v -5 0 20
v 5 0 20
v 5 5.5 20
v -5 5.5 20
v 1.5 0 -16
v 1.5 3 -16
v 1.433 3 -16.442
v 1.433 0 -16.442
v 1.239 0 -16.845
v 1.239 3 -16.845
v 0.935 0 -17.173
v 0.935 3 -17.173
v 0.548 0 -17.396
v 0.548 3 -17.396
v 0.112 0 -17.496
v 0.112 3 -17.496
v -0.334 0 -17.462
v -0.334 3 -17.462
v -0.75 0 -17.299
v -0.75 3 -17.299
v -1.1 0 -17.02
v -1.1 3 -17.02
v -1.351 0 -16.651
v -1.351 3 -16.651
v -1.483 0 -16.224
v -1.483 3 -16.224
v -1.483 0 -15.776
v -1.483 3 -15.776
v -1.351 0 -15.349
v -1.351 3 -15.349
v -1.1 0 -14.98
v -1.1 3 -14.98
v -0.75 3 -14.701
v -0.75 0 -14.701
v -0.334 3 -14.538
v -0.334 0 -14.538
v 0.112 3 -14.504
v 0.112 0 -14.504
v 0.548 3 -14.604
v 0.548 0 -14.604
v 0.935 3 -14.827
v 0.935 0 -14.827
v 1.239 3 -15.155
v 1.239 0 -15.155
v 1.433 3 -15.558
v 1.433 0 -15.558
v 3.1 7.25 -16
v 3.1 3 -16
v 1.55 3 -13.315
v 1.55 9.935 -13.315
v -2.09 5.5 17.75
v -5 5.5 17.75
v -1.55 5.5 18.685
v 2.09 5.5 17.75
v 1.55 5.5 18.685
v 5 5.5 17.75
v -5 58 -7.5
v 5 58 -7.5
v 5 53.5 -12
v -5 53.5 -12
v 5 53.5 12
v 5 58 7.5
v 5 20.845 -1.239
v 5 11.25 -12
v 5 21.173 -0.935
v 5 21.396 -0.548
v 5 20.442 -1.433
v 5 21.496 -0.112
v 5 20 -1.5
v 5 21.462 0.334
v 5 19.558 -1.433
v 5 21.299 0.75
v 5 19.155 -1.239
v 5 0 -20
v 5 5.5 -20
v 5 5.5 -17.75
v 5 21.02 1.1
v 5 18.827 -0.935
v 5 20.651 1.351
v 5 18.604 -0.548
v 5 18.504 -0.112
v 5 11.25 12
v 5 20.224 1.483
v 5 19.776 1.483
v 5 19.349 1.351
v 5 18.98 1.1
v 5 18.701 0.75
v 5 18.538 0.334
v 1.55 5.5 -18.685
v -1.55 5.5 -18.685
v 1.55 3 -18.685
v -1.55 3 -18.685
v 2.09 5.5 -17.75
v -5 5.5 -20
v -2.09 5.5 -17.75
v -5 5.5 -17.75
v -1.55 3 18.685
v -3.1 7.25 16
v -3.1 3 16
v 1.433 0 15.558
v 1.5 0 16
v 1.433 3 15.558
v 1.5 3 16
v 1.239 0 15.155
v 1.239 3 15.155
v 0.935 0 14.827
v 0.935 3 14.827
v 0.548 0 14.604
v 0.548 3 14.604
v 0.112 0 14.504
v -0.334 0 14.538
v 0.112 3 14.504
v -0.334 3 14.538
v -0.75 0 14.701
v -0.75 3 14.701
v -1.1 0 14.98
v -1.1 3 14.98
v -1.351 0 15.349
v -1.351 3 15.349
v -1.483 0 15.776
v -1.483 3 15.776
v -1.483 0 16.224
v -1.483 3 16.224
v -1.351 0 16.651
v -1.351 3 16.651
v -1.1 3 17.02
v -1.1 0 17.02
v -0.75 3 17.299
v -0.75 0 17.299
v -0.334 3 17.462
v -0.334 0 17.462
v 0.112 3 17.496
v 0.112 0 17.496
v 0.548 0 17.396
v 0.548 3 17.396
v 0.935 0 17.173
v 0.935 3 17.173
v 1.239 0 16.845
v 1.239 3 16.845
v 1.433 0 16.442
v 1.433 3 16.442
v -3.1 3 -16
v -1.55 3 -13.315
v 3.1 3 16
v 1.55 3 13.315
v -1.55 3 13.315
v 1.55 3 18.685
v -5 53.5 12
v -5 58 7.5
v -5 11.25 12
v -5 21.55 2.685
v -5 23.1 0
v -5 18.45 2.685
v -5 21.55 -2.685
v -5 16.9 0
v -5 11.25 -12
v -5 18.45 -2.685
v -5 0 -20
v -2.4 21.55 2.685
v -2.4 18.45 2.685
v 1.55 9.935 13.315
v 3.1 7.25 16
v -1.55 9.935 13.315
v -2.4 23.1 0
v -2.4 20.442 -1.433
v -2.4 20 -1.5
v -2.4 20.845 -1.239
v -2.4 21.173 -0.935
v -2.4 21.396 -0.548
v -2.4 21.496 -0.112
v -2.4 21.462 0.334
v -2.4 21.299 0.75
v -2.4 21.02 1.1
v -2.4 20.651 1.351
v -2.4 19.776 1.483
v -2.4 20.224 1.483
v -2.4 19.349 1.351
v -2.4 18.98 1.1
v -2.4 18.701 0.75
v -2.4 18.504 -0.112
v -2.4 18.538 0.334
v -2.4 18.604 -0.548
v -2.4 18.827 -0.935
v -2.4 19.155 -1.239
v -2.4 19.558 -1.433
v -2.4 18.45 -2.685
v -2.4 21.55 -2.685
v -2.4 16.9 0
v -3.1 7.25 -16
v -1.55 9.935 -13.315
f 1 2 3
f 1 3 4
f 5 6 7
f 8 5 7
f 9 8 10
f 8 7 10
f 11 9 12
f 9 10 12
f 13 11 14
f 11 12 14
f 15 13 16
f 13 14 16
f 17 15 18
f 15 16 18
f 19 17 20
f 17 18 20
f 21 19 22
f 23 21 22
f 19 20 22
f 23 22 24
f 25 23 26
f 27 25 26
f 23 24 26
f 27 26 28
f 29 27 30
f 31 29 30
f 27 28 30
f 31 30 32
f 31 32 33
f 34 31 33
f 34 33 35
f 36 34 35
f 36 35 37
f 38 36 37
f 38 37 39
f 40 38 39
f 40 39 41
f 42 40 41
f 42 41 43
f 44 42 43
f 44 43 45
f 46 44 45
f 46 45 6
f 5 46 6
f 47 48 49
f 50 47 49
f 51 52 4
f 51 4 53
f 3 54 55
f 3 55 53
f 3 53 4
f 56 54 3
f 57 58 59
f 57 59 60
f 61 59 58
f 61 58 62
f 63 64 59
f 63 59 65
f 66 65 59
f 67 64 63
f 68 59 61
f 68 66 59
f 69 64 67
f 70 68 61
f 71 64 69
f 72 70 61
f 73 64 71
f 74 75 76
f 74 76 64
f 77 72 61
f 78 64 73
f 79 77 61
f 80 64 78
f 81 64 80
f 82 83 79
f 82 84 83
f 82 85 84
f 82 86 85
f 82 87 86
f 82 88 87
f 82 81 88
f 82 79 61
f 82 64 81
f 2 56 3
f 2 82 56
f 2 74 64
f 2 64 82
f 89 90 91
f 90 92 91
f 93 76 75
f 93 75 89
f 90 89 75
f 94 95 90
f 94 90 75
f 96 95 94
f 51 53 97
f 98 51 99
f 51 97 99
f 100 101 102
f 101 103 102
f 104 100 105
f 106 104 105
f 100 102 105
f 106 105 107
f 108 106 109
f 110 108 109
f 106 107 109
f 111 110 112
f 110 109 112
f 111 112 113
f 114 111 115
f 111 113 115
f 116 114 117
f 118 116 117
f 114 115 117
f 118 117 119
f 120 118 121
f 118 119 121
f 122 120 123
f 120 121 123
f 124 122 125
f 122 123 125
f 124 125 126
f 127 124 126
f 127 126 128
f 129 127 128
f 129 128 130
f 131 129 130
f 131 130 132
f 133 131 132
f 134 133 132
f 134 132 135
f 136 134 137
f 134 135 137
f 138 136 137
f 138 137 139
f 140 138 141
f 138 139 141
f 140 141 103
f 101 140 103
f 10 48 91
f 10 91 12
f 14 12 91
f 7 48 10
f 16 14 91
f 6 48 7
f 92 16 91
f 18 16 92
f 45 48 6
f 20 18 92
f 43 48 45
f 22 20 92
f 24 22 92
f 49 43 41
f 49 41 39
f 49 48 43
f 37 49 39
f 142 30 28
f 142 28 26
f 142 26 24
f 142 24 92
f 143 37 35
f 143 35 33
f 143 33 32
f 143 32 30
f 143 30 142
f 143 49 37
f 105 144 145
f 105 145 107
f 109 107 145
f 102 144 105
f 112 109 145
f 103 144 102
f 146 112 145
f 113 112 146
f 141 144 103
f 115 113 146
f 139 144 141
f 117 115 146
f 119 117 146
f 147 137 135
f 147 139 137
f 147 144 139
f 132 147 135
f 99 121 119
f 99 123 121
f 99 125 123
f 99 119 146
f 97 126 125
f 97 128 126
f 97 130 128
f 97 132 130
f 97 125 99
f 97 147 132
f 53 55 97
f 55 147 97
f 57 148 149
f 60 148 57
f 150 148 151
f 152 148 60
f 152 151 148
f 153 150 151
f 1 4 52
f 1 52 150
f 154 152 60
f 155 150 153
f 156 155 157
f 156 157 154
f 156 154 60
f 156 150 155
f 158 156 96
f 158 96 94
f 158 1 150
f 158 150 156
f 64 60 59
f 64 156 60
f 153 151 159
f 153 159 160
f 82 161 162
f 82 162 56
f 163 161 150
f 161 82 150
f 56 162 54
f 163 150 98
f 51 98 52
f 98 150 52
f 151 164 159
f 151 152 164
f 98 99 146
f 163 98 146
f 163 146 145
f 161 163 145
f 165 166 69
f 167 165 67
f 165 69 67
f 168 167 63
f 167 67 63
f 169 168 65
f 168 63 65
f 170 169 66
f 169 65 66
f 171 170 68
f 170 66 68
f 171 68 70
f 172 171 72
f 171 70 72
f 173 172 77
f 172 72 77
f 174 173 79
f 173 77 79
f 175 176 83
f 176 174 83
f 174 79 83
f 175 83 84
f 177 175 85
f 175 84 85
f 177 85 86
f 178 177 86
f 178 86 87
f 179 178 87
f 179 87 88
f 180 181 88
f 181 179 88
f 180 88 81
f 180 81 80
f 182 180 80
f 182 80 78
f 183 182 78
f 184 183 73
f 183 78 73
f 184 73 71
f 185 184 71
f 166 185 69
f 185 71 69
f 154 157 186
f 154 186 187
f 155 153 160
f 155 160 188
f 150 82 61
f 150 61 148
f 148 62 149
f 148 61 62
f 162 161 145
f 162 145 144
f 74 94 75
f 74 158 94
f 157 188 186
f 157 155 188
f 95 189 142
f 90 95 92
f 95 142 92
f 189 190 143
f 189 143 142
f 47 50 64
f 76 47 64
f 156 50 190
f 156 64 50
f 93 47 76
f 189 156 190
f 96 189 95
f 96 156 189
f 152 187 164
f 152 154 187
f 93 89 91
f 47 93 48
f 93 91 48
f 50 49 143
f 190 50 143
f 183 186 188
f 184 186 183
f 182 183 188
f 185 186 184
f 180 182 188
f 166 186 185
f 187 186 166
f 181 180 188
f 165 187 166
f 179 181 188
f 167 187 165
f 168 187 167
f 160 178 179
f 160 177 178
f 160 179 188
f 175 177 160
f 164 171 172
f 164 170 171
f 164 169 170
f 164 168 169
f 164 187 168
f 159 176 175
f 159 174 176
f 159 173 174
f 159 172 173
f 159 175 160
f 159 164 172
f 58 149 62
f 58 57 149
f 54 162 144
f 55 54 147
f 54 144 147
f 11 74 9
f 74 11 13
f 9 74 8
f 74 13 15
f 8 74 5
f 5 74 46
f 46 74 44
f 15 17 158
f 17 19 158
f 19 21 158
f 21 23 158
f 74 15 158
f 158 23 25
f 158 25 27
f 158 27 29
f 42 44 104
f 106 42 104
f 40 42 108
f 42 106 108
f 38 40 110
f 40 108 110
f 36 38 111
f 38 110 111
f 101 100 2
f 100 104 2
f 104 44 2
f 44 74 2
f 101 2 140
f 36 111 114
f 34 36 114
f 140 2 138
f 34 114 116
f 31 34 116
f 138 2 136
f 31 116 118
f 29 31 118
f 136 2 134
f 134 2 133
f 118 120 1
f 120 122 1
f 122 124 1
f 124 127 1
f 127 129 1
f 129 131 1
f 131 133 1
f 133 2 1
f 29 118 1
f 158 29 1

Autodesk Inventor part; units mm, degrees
ref_plane "YZ Plane" through (0, 0, 0) normal (1, 0, 0) x (0, 1, 0)
ref_plane "XZ Plane" through (0, 0, 0) normal (0, 1, 0) x (-1, 0, 0)
ref_plane "XY Plane" through (0, 0, 0) normal (0, 0, 1) x (1, 0, 0)
sketch "Эскиз1" plane through (0, 0, 0) normal (0, 1, 0) x (-1, 0, 0)
  line L0 (-5, 20) -> (5, 20)
  line L1 (5, 20) -> (5, -20)
  line L2 (5, -20) -> (-5, -20)
  line L3 (-5, -20) -> (-5, 20)
  line L4 (-5, 20) -> (5, -20) construction
  line L5 (5, 20) -> (-5, -20) construction
  point P0 (0, 0)
  dimension "d0" = 10
  dimension "d1" = 40
extrude "Выдавливание1" add sketch "Эскиз1" along normal blind 3
sketch "Эскиз2" plane through (0, 3, 0) normal (0, 1, 0) x (1, 0, 0)
  line L0 (-5, 20) -> (-5, -20) projected
  line L1 (5, -12) -> (-5, -12)
  line L2 (-5, -12) -> (-5, 12)
  line L3 (-5, 12) -> (5, 12)
  line L4 (5, 12) -> (5, -12)
  line L5 (5, -12) -> (-5, 12) construction
  line L6 (-5, -12) -> (5, 12) construction
  point P0 (0, 0)
  dimension "d4" = 24
extrude "Выдавливание2" add sketch "Эскиз2" along normal blind 55
sketch "Эскиз3" plane through (0, 3, 0) normal (0, 1, 0) x (1, 0, 0)
  circle A0 centre (0, -16) radius 1.5
  line L0 (-5, -12) -> (-5, -20) projected
  line L1 (-5, -20) -> (5, -20) projected
  point P0 (0, 0)
  dimension "d7" = 3
  dimension "d8" = 5
  dimension "d9" = 4
extrude "Выдавливание3" cut sketch "Эскиз3" against normal blind 20
mirror "Зеркальное отражение1" about plane through (0, 0, 0) normal (0, 0, 1) of "Выдавливание3"
sketch "Эскиз4" plane through (0, 3, 0) normal (0, 1, 0) x (1, 0, 0)
  circle A0 centre (0, -16) radius 1.5 projected
  line L0 (-3.1, -16) -> (-1.55, -13.3153)
  line L1 (-1.55, -13.3153) -> (1.55, -13.3153)
  line L2 (1.55, -13.3153) -> (3.1, -16)
  line L3 (3.1, -16) -> (1.55, -18.6847)
  line L4 (1.55, -18.6847) -> (-1.55, -18.6847)
  line L5 (-1.55, -18.6847) -> (-3.1, -16)
  line L6 (-5, -12) -> (5, -12) projected
  line L7 (5, -20) -> (-5, -20)
  line L8 (-5, -20) -> (-5, -12)
  line L9 (-5, -12) -> (5, -12)
  line L10 (5, -12) -> (5, -20)
  line L11 (5, -20) -> (-5, -12) construction
  line L12 (-5, -20) -> (5, -12) construction
  point P0 (0, 0)
  dimension "d12" = 6.2
extrude "Выдавливание4" add sketch "Эскиз4" along normal blind 2.5 contours L6 L10 L7 L8
mirror "Зеркальное отражение2" about plane through (0, 0, 0) normal (0, 0, 1) of "Выдавливание4"
sketch "Эскиз5" plane through (5, 0, 20) normal (1, 0, 0) x (0, 0, -1)
  circle A0 centre (20, 20) radius 1.5
  line L0 (40, 0) -> (0, 0) projected
  point P0 (20, 0)
  dimension "d16" = 3
  dimension "d29" = 20
extrude "Выдавливание5" cut sketch "Эскиз5" against normal blind 27.5
sketch "Эскиз6" plane through (-5, 0, -20) normal (-1, 0, 0) x (0, 0, 1)
  circle A0 centre (20, 20) radius 1.5 projected
  line L0 (20, 23.1) -> (22.6847, 21.55)
  line L1 (22.6847, 21.55) -> (22.6847, 18.45)
  line L2 (22.6847, 18.45) -> (20, 16.9)
  line L3 (20, 16.9) -> (17.3153, 18.45)
  line L4 (17.3153, 18.45) -> (17.3153, 21.55)
  line L5 (17.3153, 21.55) -> (20, 23.1)
  point P0 (20, 0)
  point P1 (0, 0)
  dimension "d20" = 6.2
extrude "Выдавливание6" cut sketch "Эскиз6" against normal blind 2.6
chamfer "Фаска1" distance 4.5 angle 45 2 edges at (0, 58, 12) (0, 58, -12)
chamfer "Фаска2" distance 5.75 angle 45 2 edges at (0, 5.5, 12) (0, 5.5, -12)
sketch "Эскиз7" plane through (0, 0, 0) normal (0, -1, 0) x (1, 0, 0)
  circle A0 centre (0, -16) radius 1.5 projected
  circle A1 centre (0, 16) radius 1.5 projected
  line L0 (5, 20) -> (-5, 20) projected
  line L1 (-5, 20) -> (-5, -20) projected
  line L2 (-5, -20) -> (5, -20) projected
  line L3 (5, -20) -> (5, 20) projected
  point P0 (0, 0)
properties part number "000.209 - Крепеж крышки"
